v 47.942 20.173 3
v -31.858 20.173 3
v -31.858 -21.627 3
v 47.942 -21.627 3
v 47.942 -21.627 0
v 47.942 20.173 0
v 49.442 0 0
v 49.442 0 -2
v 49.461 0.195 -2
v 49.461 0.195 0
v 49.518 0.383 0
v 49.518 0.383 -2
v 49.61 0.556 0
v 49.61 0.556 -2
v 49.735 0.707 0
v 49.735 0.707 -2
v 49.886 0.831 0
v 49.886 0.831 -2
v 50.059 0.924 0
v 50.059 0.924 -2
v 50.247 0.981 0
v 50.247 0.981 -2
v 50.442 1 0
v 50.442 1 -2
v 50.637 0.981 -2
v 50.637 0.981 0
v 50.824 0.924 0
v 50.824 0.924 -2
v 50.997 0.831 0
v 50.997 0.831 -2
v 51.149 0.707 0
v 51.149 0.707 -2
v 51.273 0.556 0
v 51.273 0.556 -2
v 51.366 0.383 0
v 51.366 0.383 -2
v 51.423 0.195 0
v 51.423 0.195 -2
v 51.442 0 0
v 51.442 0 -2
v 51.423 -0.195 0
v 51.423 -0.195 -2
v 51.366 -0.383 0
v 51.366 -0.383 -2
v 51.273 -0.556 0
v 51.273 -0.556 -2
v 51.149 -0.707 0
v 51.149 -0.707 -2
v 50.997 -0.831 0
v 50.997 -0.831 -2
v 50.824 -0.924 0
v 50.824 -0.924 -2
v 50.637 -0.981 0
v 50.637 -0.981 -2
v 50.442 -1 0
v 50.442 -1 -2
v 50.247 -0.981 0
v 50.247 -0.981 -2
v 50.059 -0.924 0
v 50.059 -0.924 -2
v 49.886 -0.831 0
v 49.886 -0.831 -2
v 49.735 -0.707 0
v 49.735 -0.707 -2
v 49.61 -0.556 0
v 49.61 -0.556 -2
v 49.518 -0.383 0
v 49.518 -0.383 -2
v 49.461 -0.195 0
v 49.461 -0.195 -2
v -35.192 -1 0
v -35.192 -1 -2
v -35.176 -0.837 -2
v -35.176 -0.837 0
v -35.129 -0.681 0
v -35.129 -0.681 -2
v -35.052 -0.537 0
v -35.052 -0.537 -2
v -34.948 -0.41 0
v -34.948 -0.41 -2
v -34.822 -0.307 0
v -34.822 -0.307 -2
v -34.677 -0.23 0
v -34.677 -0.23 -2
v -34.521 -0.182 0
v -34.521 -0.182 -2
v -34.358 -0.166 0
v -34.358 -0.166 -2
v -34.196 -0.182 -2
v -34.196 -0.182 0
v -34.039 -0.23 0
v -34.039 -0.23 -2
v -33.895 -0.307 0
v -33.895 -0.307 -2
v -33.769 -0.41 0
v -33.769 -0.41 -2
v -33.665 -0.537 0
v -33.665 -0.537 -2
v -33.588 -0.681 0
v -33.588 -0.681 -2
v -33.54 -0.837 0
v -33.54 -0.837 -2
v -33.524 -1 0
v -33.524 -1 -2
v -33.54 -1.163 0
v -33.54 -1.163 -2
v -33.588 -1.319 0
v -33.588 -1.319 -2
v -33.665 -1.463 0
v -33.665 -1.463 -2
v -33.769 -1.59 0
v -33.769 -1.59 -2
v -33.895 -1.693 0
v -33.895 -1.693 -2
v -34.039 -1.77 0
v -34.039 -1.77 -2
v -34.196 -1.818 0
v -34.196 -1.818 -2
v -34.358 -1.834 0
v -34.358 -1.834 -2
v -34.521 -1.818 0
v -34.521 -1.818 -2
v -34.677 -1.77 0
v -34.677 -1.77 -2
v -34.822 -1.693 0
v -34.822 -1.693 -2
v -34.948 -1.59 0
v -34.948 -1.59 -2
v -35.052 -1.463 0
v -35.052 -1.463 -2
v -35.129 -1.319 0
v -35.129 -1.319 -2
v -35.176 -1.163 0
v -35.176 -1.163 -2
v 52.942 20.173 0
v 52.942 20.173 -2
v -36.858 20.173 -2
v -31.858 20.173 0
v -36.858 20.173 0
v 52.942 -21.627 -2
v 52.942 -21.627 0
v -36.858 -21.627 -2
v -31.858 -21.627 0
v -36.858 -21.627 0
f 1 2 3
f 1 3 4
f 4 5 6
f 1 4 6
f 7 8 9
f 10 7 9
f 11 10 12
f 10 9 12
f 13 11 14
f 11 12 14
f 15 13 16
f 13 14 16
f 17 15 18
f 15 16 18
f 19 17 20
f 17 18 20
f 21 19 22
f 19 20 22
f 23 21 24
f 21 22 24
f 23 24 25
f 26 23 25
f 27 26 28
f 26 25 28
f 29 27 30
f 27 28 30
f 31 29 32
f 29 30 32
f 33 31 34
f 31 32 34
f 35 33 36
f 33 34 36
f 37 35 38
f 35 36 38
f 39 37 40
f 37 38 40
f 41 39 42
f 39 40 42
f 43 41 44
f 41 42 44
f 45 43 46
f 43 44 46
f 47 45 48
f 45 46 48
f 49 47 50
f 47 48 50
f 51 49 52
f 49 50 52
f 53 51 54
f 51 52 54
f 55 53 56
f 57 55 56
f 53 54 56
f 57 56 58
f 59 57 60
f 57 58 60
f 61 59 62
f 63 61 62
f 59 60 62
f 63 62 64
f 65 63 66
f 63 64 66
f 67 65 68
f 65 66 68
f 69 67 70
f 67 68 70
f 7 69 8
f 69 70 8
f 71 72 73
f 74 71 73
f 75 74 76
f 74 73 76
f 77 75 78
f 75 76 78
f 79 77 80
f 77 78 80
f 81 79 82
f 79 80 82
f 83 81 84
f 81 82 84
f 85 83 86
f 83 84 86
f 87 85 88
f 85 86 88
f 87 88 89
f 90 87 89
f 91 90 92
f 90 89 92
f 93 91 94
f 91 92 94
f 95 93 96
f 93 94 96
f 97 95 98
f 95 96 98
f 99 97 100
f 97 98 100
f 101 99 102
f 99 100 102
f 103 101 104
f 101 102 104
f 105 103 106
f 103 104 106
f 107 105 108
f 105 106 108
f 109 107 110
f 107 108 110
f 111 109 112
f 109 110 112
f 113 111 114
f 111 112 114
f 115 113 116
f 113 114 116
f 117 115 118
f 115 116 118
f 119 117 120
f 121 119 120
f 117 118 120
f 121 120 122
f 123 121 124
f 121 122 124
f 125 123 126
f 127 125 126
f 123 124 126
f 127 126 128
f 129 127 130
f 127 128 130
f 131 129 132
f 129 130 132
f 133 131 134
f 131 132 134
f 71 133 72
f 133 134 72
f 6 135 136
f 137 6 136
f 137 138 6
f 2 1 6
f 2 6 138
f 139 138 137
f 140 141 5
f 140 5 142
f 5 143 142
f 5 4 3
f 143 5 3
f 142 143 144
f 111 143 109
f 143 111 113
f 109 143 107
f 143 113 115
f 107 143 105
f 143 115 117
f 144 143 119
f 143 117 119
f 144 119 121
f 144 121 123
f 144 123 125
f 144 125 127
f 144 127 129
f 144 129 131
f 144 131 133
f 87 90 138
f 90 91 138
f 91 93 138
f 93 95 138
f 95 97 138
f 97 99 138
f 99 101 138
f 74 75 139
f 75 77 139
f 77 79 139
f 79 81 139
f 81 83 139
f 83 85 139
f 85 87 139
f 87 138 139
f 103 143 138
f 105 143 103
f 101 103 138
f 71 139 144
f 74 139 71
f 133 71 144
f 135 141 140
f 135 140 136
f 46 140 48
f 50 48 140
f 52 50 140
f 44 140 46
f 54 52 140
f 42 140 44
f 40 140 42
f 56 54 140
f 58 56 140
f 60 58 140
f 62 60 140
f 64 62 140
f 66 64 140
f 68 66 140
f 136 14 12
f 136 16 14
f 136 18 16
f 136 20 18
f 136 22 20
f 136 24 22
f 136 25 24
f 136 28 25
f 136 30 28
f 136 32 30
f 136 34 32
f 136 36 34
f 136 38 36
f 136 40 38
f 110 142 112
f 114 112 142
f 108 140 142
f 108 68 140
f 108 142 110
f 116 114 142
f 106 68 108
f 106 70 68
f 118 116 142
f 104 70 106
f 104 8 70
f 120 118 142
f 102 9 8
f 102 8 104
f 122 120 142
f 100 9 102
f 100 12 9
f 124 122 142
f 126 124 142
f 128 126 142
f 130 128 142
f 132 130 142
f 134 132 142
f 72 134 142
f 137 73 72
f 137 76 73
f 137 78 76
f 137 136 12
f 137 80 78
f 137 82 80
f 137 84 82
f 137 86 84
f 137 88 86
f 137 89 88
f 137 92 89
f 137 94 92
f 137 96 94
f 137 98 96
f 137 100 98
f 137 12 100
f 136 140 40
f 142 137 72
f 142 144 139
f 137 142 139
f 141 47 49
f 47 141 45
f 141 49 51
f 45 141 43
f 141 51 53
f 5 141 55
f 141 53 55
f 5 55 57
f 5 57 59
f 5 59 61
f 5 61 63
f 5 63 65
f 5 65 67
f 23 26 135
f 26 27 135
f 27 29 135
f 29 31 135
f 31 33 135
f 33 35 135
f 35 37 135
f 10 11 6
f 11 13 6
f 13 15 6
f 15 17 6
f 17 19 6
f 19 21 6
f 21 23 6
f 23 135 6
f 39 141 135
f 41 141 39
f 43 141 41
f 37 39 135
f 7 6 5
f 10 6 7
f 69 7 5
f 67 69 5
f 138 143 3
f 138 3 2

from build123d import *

# Parameters (mm, degrees)
SKETCH1_W           = 79.8
SKETCH1_H           = 41.8
BOSS_EXTRUDE1_DEPTH = 3
SKETCH2_W           = 89.8
SKETCH2_H           = 41.8
BOSS_EXTRUDE4_DEPTH = 2
SKETCH3_R           = 1
SKETCH3_R_2         = 0.833875984
CUT_EXTRUDE1_DEPTH  = 2


with BuildPart() as part:
    # Sketch1 → Boss-Extrude1 (new body)
    with BuildSketch(Plane.XY):
        with Locations((8.041732283, -0.726771654)):
            Rectangle(SKETCH1_W, SKETCH1_H)
    extrude(amount=BOSS_EXTRUDE1_DEPTH)

    # Sketch2 → Boss-Extrude4 (add)
    with BuildSketch(Plane(origin=(0, 0, 0), x_dir=(-1, 0, 0), z_dir=(0, 0, -1))):
        with Locations((-8.041732283, -0.726771654)):
            Rectangle(SKETCH2_W, SKETCH2_H)
    extrude(amount=BOSS_EXTRUDE4_DEPTH)

    # Sketch3 → Cut-Extrude1 (cut)
    with BuildSketch(Plane(origin=(0, 0, -2), x_dir=(-1, 0, 0), z_dir=(0, 0, -1))):
        with Locations((-50.441732283, 0)):
            Circle(SKETCH3_R)
        with Locations((34.358267717, -1)):
            Circle(SKETCH3_R_2)
    extrude(amount=-CUT_EXTRUDE1_DEPTH, mode=Mode.SUBTRACT)


solid = part.part
